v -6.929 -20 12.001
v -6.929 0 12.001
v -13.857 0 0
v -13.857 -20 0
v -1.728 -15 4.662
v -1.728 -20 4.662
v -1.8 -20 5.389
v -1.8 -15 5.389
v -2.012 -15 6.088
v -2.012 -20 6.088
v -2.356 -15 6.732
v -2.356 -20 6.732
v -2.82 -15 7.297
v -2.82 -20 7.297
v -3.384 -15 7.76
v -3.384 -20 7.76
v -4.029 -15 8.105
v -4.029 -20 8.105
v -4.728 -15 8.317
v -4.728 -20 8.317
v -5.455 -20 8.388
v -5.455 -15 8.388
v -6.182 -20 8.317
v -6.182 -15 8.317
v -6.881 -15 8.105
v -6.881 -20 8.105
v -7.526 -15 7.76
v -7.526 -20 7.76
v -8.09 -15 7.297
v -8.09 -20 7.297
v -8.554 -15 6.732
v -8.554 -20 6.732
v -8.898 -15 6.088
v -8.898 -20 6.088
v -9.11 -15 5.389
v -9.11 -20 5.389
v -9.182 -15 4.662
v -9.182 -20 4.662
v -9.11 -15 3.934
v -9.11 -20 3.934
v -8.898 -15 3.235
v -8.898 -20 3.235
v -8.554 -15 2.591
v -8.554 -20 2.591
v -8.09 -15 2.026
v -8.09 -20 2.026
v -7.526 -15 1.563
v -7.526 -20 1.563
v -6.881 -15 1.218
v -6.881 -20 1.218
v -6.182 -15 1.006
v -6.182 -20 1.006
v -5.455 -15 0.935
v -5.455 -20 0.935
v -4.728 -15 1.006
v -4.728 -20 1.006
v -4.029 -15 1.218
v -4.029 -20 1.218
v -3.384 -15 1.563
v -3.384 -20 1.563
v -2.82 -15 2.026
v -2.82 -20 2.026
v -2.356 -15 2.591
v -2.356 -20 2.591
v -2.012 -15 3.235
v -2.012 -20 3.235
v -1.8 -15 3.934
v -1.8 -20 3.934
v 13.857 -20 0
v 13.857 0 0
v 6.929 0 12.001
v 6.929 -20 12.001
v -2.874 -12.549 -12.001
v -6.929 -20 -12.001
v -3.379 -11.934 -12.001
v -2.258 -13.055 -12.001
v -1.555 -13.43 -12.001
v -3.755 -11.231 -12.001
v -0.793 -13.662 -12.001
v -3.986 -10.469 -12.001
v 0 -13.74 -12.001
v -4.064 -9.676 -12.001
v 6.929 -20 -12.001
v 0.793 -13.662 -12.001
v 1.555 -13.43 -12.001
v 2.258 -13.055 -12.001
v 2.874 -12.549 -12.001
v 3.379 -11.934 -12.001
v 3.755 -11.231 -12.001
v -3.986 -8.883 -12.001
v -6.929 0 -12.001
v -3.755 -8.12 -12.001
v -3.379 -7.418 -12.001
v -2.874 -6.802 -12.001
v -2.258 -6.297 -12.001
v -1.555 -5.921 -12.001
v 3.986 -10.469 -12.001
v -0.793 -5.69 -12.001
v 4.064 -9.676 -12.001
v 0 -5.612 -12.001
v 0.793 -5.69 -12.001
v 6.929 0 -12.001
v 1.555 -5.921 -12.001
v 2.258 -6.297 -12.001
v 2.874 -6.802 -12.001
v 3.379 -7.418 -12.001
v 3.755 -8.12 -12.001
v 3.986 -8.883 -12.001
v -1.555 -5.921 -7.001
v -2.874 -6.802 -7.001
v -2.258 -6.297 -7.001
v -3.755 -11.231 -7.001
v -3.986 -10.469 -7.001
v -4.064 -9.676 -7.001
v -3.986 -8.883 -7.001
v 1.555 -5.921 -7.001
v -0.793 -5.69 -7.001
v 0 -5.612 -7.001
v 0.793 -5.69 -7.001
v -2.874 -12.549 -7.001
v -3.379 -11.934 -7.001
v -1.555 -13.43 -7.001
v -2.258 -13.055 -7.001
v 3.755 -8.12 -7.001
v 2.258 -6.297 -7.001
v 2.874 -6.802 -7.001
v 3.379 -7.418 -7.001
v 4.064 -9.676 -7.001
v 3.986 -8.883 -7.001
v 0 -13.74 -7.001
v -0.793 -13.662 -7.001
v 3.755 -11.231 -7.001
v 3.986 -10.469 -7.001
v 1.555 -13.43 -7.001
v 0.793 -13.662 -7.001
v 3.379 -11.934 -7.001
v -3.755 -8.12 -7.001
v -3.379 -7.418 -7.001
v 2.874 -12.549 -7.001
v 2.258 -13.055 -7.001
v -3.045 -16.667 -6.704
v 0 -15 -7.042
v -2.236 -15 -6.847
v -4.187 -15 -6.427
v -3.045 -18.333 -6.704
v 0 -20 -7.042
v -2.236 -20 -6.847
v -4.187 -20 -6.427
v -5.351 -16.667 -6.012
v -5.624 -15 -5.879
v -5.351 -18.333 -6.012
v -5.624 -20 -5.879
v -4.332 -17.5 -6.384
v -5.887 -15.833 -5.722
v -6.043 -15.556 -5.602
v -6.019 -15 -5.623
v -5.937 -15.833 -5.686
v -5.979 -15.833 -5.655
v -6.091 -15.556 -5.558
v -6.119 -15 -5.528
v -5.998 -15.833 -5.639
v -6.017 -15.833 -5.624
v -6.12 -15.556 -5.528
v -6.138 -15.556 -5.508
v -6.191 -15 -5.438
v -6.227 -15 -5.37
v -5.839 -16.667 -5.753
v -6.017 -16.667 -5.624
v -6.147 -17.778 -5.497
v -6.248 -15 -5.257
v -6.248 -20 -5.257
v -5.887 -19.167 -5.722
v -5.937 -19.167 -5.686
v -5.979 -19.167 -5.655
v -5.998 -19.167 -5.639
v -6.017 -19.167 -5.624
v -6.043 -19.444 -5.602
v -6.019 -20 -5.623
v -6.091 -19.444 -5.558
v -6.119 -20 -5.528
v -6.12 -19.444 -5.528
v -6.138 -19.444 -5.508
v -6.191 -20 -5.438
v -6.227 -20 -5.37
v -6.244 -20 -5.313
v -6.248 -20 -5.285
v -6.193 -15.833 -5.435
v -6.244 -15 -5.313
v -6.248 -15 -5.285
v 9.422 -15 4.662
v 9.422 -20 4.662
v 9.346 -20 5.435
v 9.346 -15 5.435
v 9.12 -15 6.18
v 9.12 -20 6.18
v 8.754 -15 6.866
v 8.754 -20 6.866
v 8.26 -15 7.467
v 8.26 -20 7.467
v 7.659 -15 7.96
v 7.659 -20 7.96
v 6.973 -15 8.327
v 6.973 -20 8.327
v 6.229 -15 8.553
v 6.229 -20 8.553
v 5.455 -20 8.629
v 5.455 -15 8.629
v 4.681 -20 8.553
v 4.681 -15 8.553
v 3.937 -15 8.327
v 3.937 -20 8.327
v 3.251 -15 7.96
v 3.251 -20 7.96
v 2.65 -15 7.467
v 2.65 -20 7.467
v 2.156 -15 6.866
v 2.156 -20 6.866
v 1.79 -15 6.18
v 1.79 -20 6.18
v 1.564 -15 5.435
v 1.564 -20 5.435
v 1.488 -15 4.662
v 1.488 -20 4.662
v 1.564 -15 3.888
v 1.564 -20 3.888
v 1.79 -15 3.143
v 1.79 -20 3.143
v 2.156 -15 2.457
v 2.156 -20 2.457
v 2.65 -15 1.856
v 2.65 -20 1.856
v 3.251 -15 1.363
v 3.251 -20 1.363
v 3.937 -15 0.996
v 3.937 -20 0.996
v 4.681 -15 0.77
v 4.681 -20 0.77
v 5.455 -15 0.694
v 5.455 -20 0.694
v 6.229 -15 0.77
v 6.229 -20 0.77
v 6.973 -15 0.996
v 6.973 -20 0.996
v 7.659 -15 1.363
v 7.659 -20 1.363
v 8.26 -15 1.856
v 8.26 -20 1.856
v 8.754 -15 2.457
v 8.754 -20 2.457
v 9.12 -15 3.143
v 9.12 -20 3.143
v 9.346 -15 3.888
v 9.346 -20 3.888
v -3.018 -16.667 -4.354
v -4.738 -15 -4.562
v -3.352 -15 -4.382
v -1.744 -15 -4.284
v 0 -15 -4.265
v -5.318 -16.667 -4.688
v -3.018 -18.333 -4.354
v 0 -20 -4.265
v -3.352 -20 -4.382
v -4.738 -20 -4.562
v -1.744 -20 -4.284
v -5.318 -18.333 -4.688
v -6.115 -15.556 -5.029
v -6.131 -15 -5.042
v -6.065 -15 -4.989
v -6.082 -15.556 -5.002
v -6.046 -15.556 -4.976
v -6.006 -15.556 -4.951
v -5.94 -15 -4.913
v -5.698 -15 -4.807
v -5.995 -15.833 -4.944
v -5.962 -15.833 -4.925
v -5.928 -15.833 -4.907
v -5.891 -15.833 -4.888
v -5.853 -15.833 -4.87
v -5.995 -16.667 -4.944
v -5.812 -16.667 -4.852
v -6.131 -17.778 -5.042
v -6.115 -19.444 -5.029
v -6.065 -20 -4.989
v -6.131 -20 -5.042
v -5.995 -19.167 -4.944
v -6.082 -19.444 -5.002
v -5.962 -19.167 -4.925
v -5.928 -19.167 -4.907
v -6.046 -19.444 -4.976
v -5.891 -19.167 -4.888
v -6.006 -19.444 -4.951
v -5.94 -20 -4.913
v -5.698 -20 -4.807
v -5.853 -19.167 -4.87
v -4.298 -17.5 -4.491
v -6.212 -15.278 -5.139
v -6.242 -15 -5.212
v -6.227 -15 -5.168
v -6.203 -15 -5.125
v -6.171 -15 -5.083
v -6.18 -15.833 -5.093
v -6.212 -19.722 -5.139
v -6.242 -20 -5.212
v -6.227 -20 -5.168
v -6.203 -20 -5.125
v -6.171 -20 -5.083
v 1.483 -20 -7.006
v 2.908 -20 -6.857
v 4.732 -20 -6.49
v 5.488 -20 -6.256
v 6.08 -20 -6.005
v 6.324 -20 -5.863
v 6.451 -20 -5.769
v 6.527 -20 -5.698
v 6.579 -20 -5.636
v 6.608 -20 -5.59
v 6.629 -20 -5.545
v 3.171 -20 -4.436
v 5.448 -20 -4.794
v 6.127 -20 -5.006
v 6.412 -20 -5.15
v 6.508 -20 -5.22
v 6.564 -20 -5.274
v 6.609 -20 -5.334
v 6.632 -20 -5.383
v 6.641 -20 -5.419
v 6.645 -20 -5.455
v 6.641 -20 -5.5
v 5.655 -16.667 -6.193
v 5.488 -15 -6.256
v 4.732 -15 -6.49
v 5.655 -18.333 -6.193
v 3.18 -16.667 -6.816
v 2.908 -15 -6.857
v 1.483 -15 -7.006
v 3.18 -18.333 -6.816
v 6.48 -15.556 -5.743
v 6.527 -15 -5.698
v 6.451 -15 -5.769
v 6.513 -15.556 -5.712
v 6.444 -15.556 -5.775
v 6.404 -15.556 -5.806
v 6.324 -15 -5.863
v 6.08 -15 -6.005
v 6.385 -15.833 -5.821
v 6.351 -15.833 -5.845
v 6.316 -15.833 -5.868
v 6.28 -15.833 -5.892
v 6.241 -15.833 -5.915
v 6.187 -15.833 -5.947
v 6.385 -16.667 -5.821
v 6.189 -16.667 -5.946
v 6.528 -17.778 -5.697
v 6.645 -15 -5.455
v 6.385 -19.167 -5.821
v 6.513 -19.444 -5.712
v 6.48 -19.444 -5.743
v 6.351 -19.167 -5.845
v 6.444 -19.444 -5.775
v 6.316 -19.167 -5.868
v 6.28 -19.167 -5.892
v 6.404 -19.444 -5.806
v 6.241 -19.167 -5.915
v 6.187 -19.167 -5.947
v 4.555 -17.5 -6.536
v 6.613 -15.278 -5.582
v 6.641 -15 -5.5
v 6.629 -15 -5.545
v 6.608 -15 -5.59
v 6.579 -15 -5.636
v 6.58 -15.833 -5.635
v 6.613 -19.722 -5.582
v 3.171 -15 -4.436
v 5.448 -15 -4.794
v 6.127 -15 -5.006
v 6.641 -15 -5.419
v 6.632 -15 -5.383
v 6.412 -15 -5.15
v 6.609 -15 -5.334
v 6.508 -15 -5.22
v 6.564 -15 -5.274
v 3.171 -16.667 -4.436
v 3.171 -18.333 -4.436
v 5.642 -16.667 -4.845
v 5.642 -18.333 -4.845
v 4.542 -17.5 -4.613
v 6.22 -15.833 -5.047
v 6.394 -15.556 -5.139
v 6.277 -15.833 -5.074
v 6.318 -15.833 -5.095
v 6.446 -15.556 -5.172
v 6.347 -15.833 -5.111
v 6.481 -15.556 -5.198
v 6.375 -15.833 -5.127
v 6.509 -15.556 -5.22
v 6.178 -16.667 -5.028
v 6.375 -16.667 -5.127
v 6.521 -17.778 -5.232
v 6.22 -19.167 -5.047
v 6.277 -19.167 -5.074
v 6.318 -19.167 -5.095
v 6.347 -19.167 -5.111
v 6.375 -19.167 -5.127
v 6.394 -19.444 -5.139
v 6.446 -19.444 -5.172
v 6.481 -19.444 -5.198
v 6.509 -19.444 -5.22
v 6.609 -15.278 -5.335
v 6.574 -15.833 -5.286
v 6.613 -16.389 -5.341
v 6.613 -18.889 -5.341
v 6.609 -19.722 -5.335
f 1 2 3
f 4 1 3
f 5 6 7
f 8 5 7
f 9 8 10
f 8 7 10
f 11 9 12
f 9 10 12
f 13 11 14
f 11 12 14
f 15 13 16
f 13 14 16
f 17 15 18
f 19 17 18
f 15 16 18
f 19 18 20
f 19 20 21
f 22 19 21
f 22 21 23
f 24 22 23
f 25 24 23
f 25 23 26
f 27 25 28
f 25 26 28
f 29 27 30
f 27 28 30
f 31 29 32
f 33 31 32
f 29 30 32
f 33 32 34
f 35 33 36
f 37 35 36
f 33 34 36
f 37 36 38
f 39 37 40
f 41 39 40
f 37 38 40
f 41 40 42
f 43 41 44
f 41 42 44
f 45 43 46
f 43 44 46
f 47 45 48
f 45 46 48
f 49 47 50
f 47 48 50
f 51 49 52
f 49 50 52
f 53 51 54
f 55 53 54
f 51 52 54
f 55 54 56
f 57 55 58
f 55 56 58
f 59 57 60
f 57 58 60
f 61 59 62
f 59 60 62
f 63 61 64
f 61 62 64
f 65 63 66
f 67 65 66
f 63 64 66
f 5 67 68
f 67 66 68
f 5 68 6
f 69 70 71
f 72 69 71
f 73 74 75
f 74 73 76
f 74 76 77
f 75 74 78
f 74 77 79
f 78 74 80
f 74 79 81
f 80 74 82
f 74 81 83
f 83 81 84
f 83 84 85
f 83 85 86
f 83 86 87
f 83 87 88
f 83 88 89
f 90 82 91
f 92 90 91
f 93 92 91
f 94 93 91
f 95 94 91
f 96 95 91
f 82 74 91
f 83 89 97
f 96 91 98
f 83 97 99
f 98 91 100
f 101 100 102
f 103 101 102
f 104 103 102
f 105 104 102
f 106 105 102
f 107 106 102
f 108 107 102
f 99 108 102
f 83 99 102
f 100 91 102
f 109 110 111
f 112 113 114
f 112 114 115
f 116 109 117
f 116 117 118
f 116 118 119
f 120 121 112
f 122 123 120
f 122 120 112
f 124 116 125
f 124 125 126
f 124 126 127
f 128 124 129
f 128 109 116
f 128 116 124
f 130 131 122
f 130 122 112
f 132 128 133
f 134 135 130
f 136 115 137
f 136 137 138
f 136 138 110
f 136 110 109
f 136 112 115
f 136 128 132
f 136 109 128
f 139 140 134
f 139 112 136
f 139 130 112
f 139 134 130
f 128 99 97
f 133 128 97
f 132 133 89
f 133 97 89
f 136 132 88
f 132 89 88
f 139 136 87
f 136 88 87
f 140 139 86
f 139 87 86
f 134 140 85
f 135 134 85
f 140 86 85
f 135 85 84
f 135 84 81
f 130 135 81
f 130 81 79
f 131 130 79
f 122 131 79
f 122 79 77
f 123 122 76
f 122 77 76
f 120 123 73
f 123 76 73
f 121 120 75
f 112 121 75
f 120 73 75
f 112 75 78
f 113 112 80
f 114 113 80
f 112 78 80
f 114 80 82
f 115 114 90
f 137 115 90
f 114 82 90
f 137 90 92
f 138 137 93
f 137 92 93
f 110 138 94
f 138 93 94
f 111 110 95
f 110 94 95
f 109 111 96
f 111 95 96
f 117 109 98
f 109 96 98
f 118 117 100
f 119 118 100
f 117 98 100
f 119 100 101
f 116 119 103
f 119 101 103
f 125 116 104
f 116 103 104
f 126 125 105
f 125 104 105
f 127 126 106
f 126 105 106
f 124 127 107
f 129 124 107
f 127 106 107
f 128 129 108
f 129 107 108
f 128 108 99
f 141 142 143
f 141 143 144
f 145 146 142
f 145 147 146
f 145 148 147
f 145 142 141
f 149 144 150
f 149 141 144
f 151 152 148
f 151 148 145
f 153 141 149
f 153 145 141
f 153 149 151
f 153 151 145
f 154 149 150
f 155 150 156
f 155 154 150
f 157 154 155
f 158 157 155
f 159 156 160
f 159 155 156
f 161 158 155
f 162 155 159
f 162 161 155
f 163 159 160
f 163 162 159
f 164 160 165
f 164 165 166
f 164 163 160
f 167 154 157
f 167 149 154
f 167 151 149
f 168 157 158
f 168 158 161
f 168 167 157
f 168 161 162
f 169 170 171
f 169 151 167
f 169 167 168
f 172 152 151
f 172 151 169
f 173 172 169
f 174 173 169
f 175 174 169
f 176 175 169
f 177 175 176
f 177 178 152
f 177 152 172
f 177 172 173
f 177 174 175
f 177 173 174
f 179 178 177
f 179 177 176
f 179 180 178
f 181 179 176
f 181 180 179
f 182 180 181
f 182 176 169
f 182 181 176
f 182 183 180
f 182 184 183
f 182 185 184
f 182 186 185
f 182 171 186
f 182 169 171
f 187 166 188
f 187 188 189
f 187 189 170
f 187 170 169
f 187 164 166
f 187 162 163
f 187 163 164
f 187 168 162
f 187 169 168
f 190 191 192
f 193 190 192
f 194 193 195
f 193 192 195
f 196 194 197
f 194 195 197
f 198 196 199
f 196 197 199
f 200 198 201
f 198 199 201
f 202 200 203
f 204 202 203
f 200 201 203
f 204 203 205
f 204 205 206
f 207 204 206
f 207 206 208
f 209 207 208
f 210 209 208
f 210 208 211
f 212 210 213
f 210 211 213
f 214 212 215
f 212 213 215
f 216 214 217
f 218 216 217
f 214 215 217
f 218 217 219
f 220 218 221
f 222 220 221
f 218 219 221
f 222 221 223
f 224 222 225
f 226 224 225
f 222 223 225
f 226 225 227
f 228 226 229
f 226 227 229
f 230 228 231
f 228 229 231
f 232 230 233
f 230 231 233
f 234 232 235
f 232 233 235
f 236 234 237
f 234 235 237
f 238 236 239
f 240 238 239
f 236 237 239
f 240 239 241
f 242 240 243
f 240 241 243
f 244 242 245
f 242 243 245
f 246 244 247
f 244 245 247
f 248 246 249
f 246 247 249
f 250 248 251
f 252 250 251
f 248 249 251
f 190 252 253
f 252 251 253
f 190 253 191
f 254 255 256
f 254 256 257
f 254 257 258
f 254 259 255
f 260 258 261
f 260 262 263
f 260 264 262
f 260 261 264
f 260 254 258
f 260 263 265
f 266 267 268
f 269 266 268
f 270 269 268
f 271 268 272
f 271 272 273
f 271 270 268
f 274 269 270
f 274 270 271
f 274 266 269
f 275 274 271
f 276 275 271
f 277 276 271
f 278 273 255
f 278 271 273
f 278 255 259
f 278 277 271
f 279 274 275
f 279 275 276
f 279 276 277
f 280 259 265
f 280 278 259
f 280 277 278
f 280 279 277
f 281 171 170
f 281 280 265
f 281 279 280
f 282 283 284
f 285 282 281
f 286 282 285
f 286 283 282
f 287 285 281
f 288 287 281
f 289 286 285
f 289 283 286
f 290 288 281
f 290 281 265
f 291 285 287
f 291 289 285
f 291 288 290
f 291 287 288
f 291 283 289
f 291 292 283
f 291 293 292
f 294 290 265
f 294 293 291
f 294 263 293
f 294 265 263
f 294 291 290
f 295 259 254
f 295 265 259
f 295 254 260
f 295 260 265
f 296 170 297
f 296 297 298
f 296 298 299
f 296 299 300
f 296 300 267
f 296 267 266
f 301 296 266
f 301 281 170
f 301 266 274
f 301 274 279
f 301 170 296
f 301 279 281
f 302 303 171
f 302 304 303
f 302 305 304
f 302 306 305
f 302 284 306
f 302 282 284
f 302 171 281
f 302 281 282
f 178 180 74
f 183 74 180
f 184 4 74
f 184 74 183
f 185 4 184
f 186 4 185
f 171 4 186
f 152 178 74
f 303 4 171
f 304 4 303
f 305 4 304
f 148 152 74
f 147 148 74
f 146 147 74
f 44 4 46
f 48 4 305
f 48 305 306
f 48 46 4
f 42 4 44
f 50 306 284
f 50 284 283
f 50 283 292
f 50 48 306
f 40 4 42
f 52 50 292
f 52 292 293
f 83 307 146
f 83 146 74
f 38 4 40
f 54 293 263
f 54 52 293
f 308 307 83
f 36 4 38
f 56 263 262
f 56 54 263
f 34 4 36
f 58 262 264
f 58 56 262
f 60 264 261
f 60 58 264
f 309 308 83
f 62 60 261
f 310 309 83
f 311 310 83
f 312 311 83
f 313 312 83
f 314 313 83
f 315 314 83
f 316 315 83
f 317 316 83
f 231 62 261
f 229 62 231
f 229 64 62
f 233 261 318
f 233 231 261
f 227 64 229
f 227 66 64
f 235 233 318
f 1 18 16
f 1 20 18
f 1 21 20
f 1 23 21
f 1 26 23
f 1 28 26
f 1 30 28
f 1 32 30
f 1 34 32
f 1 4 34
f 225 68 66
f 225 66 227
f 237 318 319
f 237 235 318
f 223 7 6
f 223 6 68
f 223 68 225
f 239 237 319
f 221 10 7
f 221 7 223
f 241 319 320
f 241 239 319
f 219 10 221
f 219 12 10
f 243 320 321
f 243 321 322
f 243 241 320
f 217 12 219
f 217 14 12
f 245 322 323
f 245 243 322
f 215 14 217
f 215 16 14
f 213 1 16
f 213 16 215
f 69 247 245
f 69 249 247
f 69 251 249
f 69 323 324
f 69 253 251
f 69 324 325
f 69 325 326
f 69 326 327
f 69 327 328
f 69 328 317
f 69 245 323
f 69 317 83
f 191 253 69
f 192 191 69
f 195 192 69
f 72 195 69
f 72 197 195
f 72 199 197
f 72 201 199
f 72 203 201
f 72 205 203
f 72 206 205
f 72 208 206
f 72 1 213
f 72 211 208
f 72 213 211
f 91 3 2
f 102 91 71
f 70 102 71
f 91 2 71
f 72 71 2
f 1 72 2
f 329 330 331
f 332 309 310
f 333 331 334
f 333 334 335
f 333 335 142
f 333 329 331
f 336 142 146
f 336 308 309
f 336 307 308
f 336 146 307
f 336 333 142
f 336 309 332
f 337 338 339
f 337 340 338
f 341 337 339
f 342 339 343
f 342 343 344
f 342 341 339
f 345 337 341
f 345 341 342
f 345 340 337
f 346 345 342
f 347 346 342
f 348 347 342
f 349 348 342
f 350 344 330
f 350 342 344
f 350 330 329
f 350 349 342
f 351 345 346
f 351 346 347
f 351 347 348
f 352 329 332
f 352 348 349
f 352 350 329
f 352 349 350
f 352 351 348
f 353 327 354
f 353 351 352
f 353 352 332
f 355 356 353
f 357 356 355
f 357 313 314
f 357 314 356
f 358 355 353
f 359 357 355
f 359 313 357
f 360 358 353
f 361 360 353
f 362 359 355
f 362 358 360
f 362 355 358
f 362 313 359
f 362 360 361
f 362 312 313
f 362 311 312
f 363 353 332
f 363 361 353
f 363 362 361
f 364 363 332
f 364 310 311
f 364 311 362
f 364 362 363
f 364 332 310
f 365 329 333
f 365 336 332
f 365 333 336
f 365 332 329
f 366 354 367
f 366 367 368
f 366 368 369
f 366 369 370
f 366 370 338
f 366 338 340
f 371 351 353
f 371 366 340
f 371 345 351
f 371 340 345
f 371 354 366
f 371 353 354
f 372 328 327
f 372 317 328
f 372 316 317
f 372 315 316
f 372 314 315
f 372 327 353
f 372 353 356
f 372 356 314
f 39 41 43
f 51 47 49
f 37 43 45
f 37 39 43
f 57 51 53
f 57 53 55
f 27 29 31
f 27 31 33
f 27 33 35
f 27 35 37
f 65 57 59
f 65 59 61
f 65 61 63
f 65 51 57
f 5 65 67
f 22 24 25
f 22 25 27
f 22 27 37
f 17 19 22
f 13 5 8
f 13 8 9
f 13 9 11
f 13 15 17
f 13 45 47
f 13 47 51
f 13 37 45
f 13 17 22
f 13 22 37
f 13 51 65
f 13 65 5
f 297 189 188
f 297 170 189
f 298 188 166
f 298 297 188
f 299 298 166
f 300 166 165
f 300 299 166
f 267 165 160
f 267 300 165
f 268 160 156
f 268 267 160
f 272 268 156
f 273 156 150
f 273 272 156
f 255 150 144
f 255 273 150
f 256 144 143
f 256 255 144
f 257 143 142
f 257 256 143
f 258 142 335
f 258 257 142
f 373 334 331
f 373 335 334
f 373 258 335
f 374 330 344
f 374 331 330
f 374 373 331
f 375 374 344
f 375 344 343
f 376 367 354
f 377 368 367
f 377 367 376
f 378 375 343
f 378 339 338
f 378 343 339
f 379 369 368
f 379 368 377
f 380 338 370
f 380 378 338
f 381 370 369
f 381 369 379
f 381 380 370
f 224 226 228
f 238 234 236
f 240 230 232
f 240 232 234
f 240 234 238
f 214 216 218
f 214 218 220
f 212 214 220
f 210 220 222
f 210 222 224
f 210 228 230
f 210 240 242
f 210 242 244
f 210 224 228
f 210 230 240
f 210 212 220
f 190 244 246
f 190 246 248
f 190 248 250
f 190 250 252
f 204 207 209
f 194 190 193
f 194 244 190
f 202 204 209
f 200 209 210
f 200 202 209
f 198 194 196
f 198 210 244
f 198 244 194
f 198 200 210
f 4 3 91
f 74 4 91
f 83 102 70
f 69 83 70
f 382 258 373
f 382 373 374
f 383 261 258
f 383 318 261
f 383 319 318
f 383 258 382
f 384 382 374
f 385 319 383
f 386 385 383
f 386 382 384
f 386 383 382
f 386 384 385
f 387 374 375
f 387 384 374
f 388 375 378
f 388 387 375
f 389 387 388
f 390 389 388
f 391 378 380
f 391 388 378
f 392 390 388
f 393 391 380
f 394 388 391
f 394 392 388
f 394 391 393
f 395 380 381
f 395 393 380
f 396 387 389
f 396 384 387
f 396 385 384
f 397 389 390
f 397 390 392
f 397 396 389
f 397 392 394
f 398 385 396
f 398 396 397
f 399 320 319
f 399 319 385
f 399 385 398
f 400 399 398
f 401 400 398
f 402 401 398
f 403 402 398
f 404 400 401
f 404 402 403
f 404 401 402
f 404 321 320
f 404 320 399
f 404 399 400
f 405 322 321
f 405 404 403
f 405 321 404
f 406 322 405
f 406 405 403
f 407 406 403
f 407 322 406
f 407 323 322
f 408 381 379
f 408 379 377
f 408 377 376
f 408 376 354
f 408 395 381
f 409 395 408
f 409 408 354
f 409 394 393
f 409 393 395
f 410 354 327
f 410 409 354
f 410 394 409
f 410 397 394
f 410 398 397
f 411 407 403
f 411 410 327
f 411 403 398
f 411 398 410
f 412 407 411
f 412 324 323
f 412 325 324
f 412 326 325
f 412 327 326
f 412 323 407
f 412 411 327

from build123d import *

# Parameters (mm, degrees)
F1_DEPTH = 20
F2_R     = 3.9672544226
F2_R_2   = 3.7268973953
F4_DEPTH = 5
F6_R     = 4.0640636786
F7_DEPTH = 5
F8_DEPTH = 5


# Not quite as in the source:
# - the program builds the solid bodies; features that only make, move or delete a surface that nothing else refers to are left out


with BuildPart() as f1:
    # F0 (on Front) → F1 (new body)
    with BuildSketch(Plane.XZ):
        Polygon((-6.9287490553, -12.0009453967), (6.9287490553, -12.0009453967), (13.8574981107, 0), (6.9287490553, 12.0009453967), (-6.9287490553, 12.0009453967), (-13.8574981107, 0), align=None)
    extrude(amount=F1_DEPTH)

    # F2 (on face) → F4 (cut)
    with BuildSketch(Plane.XZ.offset(20)):
        with Locations((5.454974249, 4.6615242027)):
            Circle(F2_R)
        with Locations((-5.4549747147, 4.6615242027)):
            Circle(F2_R_2)
    extrude(amount=-F4_DEPTH, mode=Mode.SUBTRACT)

    # F6 (on face) → F7 (cut)
    with BuildSketch(Plane(origin=(0, 0, -12.0009453967), x_dir=(1, 0, 0), z_dir=(0, 0, -1))):
        with Locations((0, 9.6756508574)):
            Circle(F6_R)
    extrude(amount=-F7_DEPTH, mode=Mode.SUBTRACT)

    # F3 (on face) → F8 (cut)
    with BuildSketch(Plane.XZ.offset(20)):
        with BuildLine():
            Line((0, -5.3527420043), (0, -7.04187667))
            add(Edge.make_bspline(
                [(6.6451518796, -5.4549751803), (6.6575654316, -6.1571957747), (3.2728013866, -7.1077153996), (0, -7.04187667)],
                knots=[0.7456529131, 0.7456529131, 0.7456529131, 0.7456529131, 1, 1, 1, 1], degree=3))
            Line((6.6451518796, -5.4549751803), (0, -5.3527420043))
        make_face()
        with BuildLine():
            Line((0, -5.3527420043), (6.6451518796, -5.4549751803))
            add(Edge.make_bspline(
                [(0, -4.2647989467), (3.2636275259, -4.3042470372), (6.6328122368, -4.7569355417), (6.6451518796, -5.4549751803)],
                knots=[0.492820185, 0.492820185, 0.492820185, 0.492820185, 0.7456529131, 0.7456529131, 0.7456529131, 0.7456529131], degree=3))
            Line((0, -4.2647989467), (0, -5.3527420043))
        make_face()
        with BuildLine():
            add(Edge.make_bspline(
                [(-6.2484252267, -5.2566123195), (-6.2199094707, -4.57569338), (-3.1594165925, -4.2266104736), (0, -4.2647989467)],
                knots=[0.2480606621, 0.2480606621, 0.2480606621, 0.2480606621, 0.492820185, 0.492820185, 0.492820185, 0.492820185], degree=3))
            Line((-6.2484252267, -5.2566123195), (0, -5.3527420043))
            Line((0, -5.3527420043), (0, -4.2647989467))
        make_face()
        with BuildLine():
            add(Edge.make_bspline(
                [(0, -7.04187667), (-3.191911057, -6.9776652057), (-6.2773255825, -5.9467150004), (-6.2484252267, -5.2566123195)],
                knots=[0, 0, 0, 0, 0.2480606621, 0.2480606621, 0.2480606621, 0.2480606621], degree=3))
            Line((0, -7.04187667), (0, -5.3527420043))
            Line((0, -5.3527420043), (-6.2484252267, -5.2566123195))
        make_face()
    extrude(amount=-F8_DEPTH, mode=Mode.SUBTRACT)


solid = f1.part
